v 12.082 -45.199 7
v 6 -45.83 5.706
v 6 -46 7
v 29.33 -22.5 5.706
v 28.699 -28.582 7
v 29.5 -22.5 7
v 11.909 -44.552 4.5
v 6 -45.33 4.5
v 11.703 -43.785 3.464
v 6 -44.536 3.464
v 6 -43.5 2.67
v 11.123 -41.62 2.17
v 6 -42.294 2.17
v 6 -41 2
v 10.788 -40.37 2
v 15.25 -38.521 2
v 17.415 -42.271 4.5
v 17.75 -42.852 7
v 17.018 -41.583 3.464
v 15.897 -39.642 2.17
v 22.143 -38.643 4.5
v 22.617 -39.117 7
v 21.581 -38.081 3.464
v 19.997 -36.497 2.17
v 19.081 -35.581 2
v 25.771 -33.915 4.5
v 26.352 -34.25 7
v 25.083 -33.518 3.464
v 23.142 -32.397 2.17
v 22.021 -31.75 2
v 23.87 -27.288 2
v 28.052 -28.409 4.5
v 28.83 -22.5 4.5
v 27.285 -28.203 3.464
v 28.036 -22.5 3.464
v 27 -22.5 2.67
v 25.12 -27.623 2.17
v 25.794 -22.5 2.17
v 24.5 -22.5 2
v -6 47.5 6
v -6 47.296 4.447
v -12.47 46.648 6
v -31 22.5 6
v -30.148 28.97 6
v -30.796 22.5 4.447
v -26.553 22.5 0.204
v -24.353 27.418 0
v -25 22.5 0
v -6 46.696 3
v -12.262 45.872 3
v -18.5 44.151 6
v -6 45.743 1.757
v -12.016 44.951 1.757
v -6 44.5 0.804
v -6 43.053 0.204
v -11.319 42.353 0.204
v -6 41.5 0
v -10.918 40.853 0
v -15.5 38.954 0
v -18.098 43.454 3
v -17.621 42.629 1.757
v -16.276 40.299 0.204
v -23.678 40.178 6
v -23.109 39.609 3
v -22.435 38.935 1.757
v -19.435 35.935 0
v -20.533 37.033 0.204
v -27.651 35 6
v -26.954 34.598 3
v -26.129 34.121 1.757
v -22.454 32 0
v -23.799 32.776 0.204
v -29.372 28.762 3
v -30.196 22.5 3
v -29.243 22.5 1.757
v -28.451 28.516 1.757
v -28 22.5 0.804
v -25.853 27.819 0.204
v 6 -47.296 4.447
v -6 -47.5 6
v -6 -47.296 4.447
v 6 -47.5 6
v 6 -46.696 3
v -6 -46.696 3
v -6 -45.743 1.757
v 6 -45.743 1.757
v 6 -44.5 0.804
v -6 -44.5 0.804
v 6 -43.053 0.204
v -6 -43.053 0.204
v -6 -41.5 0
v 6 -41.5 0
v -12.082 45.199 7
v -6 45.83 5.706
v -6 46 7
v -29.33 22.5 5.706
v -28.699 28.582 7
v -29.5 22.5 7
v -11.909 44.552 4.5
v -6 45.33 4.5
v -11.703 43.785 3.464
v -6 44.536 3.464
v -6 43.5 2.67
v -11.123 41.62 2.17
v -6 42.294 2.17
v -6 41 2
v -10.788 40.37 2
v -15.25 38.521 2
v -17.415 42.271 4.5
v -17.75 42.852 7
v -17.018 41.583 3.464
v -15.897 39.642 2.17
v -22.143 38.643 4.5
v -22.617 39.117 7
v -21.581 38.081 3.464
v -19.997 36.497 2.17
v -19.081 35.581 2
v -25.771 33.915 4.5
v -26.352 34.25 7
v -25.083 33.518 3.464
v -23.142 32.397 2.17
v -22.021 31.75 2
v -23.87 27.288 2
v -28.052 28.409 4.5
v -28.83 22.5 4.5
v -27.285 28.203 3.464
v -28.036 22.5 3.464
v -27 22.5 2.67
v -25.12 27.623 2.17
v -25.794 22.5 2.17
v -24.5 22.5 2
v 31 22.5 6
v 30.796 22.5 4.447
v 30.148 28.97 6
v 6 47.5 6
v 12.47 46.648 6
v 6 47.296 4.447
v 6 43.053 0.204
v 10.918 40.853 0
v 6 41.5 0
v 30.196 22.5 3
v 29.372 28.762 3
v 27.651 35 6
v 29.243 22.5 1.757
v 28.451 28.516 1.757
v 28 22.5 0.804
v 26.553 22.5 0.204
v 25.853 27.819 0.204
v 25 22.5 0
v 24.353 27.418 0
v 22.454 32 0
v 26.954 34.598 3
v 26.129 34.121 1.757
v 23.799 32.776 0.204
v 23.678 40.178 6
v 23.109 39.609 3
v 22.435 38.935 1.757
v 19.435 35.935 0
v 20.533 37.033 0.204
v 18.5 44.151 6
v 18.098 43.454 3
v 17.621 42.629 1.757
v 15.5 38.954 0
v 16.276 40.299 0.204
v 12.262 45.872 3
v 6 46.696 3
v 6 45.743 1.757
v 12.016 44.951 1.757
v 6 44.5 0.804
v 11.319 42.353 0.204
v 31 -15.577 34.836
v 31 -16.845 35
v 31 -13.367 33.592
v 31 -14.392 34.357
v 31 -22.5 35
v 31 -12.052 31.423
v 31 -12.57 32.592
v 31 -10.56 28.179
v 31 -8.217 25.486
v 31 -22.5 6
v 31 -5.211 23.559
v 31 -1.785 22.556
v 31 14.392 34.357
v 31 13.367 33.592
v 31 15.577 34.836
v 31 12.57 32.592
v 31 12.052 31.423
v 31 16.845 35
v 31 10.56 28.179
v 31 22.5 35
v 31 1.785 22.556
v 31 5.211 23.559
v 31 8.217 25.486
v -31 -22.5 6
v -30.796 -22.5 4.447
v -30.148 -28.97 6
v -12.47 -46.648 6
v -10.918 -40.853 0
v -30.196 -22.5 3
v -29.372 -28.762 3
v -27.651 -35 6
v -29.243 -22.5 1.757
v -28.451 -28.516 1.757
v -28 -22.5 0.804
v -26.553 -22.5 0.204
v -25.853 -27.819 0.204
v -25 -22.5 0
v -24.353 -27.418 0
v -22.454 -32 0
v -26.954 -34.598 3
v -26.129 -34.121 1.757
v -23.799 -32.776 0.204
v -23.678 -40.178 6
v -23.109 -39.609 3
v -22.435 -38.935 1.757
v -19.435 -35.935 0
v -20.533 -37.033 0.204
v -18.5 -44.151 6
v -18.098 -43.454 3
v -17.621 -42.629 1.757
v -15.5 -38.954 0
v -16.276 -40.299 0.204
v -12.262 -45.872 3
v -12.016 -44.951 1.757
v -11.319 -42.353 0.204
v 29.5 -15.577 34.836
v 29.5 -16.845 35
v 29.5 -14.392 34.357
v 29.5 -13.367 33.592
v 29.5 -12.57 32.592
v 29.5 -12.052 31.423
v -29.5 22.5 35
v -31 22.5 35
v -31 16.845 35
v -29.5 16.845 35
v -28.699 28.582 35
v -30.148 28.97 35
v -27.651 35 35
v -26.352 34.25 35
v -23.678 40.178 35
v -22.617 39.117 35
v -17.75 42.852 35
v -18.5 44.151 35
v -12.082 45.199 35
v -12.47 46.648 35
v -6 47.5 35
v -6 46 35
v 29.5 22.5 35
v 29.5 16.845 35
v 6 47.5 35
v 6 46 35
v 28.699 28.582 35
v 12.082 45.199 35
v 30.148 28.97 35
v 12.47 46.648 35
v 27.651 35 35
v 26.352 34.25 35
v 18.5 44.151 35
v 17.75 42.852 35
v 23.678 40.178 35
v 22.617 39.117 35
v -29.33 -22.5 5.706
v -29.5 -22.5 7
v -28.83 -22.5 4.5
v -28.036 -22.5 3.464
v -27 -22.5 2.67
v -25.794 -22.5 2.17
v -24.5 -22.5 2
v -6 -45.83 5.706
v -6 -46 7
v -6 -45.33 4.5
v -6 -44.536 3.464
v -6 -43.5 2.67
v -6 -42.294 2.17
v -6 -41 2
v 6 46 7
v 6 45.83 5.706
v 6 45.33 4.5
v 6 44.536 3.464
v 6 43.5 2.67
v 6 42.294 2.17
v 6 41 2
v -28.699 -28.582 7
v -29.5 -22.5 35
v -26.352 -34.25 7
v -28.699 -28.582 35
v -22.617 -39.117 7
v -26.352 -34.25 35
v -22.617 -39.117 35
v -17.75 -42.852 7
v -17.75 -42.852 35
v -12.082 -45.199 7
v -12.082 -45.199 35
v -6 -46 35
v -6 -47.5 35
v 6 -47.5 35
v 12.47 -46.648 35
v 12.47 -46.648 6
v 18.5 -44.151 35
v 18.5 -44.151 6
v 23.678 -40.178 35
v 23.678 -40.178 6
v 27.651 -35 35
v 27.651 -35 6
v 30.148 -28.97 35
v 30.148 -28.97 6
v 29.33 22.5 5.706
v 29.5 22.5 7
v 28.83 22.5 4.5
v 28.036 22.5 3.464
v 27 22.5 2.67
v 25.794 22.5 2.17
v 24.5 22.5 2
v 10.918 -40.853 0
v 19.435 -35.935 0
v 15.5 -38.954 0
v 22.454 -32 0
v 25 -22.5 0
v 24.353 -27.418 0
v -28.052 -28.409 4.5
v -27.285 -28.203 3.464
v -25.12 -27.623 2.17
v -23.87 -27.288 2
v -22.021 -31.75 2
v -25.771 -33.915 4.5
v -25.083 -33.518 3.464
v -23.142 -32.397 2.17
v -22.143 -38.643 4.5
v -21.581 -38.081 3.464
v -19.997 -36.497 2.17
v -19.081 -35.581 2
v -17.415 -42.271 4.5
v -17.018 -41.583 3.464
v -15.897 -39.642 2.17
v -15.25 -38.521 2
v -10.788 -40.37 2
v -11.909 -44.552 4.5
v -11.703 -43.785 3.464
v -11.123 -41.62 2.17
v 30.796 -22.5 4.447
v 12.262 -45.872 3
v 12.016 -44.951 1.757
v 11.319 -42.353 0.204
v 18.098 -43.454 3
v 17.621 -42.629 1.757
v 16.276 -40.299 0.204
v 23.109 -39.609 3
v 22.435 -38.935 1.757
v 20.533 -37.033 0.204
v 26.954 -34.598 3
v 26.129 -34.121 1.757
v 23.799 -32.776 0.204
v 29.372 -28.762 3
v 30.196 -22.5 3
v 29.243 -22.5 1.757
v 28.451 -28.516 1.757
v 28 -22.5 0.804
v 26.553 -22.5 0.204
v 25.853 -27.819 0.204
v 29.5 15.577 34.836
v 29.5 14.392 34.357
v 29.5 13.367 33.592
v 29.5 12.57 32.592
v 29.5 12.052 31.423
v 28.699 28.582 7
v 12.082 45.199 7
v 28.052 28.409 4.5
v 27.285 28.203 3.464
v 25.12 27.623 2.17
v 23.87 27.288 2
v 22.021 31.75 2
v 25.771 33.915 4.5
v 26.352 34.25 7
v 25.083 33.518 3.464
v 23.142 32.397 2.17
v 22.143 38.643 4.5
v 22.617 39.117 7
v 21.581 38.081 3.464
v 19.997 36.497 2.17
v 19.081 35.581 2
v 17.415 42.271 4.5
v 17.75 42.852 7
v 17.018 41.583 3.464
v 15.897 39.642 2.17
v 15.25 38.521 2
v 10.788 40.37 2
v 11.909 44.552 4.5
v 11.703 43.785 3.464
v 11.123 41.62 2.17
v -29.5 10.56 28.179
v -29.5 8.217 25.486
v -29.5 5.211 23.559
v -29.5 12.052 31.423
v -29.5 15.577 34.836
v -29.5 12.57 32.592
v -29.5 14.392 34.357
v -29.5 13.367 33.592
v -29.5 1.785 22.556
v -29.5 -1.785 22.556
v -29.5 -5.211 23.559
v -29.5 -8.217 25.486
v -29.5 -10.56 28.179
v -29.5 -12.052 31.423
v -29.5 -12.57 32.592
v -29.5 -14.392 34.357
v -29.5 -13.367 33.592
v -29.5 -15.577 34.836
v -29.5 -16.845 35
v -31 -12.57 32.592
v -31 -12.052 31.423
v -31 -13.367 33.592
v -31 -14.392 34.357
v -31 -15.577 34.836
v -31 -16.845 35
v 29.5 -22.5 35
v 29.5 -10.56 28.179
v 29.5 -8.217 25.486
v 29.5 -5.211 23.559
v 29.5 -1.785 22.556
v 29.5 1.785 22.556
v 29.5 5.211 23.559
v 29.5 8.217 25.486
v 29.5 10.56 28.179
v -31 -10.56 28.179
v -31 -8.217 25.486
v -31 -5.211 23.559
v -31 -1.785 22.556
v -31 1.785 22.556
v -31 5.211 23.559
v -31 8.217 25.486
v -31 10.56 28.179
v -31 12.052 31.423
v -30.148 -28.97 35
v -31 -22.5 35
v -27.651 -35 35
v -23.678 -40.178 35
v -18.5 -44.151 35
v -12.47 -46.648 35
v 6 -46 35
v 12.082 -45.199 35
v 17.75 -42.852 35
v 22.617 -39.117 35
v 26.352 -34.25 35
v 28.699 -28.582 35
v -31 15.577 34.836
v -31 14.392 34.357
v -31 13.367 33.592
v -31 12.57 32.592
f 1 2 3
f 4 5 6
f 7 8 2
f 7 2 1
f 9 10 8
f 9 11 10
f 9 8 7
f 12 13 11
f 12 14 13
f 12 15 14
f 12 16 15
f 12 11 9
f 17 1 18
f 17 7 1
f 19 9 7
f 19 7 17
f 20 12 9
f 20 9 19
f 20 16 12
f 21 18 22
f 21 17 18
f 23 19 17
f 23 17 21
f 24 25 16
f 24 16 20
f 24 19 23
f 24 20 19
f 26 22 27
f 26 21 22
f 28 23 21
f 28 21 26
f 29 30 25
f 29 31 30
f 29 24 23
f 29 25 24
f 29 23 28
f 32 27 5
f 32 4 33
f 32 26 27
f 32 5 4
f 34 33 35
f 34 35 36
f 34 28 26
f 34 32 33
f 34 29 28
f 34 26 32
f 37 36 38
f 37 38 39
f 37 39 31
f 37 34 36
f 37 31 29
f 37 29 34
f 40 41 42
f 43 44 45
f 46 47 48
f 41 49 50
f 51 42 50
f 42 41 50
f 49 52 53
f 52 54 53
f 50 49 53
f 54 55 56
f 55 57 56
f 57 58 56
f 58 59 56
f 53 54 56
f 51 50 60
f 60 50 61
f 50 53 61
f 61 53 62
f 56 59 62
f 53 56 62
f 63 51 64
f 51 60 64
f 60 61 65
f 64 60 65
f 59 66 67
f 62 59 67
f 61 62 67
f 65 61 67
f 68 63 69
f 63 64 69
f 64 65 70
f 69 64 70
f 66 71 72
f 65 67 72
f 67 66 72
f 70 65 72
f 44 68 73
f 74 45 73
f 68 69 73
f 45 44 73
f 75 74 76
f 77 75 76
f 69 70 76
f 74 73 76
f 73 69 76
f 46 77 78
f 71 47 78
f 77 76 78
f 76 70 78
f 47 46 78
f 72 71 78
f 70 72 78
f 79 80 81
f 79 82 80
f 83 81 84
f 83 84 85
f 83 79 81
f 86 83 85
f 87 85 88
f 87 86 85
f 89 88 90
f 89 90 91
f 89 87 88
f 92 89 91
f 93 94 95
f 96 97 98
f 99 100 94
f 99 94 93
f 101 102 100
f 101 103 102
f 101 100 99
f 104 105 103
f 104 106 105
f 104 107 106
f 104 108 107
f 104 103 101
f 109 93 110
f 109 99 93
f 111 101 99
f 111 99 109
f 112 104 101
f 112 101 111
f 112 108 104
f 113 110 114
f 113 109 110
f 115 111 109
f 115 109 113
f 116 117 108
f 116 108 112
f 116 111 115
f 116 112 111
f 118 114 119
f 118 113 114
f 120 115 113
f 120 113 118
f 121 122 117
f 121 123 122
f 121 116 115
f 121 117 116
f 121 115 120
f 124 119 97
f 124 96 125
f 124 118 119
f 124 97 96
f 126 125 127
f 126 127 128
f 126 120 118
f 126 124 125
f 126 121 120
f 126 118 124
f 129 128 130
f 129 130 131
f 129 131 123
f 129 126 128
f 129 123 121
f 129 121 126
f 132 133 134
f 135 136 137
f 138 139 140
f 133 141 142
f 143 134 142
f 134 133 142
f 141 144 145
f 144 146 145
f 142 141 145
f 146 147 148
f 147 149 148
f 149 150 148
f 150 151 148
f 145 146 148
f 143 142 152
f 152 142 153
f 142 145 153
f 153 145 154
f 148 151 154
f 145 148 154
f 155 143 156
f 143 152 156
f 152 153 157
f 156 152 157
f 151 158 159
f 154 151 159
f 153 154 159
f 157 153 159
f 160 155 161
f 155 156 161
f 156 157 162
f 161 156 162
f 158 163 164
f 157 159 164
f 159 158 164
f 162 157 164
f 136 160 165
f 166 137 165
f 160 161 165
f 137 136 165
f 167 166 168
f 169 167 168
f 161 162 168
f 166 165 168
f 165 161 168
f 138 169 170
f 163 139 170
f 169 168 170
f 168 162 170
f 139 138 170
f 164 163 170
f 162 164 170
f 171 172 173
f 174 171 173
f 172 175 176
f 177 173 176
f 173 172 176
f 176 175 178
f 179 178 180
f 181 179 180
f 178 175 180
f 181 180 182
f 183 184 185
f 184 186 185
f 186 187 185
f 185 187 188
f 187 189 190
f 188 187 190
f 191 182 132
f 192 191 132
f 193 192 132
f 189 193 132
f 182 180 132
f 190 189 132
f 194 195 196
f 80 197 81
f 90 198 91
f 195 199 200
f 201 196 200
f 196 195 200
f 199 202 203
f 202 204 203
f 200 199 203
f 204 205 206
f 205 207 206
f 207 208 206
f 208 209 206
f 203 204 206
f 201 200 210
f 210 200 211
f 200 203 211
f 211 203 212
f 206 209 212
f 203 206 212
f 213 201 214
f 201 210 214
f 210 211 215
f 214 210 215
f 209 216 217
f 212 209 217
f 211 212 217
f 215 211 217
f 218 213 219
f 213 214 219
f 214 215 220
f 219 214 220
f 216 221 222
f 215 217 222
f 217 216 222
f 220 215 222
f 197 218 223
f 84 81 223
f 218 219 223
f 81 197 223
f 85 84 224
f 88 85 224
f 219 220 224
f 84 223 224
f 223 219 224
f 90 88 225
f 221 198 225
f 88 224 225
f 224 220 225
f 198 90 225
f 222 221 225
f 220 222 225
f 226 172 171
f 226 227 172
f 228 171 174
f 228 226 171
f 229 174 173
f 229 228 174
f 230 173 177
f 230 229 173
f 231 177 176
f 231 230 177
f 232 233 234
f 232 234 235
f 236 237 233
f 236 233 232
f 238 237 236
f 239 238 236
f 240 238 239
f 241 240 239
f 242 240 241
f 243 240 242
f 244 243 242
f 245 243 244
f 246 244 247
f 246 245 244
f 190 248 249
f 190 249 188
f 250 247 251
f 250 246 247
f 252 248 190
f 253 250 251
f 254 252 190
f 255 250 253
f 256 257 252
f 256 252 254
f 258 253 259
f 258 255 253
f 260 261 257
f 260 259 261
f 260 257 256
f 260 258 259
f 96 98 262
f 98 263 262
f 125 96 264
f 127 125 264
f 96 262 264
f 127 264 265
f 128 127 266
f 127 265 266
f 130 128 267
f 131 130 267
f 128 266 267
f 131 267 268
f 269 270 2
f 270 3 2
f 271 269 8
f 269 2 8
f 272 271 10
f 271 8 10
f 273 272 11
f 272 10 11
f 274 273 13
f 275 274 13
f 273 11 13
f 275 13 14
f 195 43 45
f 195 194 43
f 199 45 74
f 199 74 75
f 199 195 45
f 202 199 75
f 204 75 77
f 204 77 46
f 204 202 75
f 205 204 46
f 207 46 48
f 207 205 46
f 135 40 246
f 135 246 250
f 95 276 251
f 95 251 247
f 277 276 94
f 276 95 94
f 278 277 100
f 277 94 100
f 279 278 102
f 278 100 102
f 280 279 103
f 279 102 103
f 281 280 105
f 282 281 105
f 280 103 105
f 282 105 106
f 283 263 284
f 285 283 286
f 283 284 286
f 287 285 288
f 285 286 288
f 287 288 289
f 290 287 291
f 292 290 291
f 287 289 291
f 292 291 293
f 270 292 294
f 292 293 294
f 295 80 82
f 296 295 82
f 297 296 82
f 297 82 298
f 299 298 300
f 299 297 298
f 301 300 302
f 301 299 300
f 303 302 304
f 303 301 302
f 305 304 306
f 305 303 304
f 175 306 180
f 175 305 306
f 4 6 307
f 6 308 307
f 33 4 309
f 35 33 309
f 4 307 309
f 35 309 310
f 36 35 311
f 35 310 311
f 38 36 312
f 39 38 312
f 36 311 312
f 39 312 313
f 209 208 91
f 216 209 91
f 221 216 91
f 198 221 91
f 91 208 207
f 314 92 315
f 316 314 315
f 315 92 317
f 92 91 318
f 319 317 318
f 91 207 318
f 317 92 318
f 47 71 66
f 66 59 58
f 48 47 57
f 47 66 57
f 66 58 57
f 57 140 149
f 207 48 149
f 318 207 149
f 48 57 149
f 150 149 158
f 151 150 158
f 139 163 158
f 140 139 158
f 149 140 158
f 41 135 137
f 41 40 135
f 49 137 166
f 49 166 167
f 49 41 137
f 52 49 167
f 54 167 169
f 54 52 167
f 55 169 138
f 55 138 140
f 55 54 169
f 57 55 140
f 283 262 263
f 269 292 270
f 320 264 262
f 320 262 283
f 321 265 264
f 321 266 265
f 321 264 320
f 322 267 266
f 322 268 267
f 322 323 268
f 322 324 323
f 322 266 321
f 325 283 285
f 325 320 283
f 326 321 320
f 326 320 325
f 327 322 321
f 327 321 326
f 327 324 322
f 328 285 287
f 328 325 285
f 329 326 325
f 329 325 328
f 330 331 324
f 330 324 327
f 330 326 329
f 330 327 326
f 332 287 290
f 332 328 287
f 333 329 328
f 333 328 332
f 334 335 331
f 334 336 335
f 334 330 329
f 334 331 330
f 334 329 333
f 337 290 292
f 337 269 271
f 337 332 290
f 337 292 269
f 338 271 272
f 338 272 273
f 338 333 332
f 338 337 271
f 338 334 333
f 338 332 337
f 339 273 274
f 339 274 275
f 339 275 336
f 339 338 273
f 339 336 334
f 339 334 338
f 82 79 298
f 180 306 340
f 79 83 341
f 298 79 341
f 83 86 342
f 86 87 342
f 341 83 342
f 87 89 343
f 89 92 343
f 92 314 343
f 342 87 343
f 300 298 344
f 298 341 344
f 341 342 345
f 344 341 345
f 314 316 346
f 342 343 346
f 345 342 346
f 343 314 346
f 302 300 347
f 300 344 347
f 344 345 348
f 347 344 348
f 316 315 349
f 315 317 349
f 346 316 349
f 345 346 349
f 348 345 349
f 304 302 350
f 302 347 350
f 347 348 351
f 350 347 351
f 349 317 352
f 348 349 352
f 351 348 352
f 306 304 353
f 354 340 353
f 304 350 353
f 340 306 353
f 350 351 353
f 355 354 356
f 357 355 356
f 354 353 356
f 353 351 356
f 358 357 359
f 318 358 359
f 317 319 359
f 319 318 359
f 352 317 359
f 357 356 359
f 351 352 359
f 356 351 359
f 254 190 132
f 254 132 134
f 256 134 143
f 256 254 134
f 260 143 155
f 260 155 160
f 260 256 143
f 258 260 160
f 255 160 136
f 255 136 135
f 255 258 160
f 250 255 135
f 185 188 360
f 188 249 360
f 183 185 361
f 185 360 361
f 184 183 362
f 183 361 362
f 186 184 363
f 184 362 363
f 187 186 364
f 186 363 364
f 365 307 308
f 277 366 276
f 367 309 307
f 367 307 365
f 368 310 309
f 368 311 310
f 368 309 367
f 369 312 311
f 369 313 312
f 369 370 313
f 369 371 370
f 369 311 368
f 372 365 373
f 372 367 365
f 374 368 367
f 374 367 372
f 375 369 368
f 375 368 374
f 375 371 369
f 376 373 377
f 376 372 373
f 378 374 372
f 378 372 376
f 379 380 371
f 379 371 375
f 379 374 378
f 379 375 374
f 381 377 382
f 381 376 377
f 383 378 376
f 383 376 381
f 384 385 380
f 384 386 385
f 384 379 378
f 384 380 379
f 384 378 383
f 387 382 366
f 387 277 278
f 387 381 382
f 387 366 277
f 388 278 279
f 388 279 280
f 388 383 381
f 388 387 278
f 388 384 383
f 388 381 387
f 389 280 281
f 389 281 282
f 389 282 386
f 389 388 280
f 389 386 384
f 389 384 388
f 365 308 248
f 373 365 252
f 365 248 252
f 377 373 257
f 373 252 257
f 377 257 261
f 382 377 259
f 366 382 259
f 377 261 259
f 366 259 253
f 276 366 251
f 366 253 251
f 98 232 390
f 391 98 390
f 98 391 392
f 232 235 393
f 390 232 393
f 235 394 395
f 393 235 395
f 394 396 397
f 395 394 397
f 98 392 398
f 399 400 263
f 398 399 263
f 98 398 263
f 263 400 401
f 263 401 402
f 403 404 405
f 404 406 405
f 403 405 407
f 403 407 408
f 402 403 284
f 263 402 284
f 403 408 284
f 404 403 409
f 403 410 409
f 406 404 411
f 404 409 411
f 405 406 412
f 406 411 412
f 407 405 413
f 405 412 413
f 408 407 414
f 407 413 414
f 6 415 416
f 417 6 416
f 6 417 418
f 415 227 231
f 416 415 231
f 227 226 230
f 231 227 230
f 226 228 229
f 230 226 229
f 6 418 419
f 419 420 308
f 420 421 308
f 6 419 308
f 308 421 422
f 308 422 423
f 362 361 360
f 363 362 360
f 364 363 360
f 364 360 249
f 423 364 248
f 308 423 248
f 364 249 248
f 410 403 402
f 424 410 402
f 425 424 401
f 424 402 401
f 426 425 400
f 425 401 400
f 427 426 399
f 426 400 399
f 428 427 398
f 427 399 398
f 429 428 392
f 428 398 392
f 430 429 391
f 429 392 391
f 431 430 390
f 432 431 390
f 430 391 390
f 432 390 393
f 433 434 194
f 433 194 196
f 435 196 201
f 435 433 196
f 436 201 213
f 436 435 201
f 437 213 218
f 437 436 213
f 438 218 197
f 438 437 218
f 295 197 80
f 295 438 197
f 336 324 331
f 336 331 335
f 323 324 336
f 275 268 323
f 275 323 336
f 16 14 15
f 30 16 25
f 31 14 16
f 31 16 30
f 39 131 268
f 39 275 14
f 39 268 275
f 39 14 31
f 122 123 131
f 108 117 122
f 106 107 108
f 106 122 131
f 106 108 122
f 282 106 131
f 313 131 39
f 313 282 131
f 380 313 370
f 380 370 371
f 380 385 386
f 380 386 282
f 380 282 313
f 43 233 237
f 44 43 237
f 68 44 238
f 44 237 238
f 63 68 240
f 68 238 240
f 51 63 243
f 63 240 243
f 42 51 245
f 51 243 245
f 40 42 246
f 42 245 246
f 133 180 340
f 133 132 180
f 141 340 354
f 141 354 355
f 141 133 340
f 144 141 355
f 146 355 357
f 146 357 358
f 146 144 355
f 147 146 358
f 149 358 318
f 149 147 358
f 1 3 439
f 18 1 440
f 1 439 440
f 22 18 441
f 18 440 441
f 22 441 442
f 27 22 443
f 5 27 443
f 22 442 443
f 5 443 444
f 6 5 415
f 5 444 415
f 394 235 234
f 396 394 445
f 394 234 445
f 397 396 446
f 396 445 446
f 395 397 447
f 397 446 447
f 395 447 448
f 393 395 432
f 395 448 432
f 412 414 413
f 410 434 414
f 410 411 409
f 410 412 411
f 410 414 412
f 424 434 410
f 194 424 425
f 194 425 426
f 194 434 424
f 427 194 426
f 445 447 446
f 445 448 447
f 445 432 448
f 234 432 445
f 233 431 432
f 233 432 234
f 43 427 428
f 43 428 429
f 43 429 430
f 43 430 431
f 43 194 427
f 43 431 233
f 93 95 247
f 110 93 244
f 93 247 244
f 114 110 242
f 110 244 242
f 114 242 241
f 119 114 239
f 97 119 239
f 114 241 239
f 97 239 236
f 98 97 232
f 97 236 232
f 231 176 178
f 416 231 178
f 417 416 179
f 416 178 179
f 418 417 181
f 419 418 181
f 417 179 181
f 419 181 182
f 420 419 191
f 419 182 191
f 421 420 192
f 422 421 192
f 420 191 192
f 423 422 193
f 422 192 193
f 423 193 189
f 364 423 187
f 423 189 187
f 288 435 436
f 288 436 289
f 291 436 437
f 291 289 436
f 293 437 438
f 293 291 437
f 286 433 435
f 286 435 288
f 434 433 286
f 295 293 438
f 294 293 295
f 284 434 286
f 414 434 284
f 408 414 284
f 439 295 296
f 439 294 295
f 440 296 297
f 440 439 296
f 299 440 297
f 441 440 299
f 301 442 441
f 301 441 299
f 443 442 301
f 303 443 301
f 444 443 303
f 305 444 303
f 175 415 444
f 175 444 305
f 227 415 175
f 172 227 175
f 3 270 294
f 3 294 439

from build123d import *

# Parameters (mm, degrees)
F0_W     = 62
F0_H     = 95
F1_DEPTH = 35
F2_R     = 25
F4_DEPTH = 33
F6_DEPTH = 62.001
F7_R     = 5
F8_R     = 5
F9_R     = 6


with BuildPart() as f1:
    # F0 (on Top) → F1 (new body)
    with BuildSketch(Plane.XY):
        Rectangle(F0_W, F0_H)
    extrude(amount=F1_DEPTH)

    # F2
    f2_edges = [f1.edges().sort_by_distance(p)[0] for p in [
        (31, 47.5, 17.5),
        (-31, 47.5, 17.5),
        (31, -47.5, 17.5),
        (-31, -47.5, 17.5),
    ]]
    fillet(f2_edges, radius=F2_R)

    # F3 (on face) → F4 (cut)
    with BuildSketch(Plane.XY.offset(35)):
        with BuildLine():
            Line((29.5, -22.5), (29.5, 22.5))
            ThreePointArc((29.5, 22.5), (22.6170093579, 39.1170093579), (6, 46))
            Line((6, 46), (-6, 46))
            ThreePointArc((-6, 46), (-22.6170093579, 39.1170093579), (-29.5, 22.5))
            Line((-29.5, 22.5), (-29.5, -22.5))
            ThreePointArc((-29.5, -22.5), (-22.6170093579, -39.1170093579), (-6, -46))
            Line((-6, -46), (6, -46))
            ThreePointArc((6, -46), (22.6170093579, -39.1170093579), (29.5, -22.5))
        make_face()
    extrude(amount=-F4_DEPTH, mode=Mode.SUBTRACT)

    # F5 (on face) → F6 (cut, through all)
    with BuildSketch(Plane.YZ.offset(31)):
        with BuildLine():
            ThreePointArc((-12.5715859231, 35), (0, 22.4284140769), (12.5715859231, 35))
            Line((12.5715859231, 35), (-12.5715859231, 35))
        make_face()
    extrude(amount=-F6_DEPTH, mode=Mode.SUBTRACT)

    # F7
    f7_edges = [f1.edges().sort_by_distance(p)[0] for p in [
        (30.25, 12.571586, 35),
        (-30.25, 12.571586, 35),
        (30.25, -12.571586, 35),
        (-30.25, -12.571586, 35),
    ]]
    fillet(f7_edges, radius=F7_R)

    # F8
    f8_edges = [f1.edges().sort_by_distance(p)[0] for p in [
        (-22.617009, 39.117009, 2),
    ]]
    fillet(f8_edges, radius=F8_R)

    # F9
    f9_edges = [f1.edges().sort_by_distance(p)[0] for p in [
        (31, 0, 0),
    ]]
    fillet(f9_edges, radius=F9_R)


solid = f1.part
